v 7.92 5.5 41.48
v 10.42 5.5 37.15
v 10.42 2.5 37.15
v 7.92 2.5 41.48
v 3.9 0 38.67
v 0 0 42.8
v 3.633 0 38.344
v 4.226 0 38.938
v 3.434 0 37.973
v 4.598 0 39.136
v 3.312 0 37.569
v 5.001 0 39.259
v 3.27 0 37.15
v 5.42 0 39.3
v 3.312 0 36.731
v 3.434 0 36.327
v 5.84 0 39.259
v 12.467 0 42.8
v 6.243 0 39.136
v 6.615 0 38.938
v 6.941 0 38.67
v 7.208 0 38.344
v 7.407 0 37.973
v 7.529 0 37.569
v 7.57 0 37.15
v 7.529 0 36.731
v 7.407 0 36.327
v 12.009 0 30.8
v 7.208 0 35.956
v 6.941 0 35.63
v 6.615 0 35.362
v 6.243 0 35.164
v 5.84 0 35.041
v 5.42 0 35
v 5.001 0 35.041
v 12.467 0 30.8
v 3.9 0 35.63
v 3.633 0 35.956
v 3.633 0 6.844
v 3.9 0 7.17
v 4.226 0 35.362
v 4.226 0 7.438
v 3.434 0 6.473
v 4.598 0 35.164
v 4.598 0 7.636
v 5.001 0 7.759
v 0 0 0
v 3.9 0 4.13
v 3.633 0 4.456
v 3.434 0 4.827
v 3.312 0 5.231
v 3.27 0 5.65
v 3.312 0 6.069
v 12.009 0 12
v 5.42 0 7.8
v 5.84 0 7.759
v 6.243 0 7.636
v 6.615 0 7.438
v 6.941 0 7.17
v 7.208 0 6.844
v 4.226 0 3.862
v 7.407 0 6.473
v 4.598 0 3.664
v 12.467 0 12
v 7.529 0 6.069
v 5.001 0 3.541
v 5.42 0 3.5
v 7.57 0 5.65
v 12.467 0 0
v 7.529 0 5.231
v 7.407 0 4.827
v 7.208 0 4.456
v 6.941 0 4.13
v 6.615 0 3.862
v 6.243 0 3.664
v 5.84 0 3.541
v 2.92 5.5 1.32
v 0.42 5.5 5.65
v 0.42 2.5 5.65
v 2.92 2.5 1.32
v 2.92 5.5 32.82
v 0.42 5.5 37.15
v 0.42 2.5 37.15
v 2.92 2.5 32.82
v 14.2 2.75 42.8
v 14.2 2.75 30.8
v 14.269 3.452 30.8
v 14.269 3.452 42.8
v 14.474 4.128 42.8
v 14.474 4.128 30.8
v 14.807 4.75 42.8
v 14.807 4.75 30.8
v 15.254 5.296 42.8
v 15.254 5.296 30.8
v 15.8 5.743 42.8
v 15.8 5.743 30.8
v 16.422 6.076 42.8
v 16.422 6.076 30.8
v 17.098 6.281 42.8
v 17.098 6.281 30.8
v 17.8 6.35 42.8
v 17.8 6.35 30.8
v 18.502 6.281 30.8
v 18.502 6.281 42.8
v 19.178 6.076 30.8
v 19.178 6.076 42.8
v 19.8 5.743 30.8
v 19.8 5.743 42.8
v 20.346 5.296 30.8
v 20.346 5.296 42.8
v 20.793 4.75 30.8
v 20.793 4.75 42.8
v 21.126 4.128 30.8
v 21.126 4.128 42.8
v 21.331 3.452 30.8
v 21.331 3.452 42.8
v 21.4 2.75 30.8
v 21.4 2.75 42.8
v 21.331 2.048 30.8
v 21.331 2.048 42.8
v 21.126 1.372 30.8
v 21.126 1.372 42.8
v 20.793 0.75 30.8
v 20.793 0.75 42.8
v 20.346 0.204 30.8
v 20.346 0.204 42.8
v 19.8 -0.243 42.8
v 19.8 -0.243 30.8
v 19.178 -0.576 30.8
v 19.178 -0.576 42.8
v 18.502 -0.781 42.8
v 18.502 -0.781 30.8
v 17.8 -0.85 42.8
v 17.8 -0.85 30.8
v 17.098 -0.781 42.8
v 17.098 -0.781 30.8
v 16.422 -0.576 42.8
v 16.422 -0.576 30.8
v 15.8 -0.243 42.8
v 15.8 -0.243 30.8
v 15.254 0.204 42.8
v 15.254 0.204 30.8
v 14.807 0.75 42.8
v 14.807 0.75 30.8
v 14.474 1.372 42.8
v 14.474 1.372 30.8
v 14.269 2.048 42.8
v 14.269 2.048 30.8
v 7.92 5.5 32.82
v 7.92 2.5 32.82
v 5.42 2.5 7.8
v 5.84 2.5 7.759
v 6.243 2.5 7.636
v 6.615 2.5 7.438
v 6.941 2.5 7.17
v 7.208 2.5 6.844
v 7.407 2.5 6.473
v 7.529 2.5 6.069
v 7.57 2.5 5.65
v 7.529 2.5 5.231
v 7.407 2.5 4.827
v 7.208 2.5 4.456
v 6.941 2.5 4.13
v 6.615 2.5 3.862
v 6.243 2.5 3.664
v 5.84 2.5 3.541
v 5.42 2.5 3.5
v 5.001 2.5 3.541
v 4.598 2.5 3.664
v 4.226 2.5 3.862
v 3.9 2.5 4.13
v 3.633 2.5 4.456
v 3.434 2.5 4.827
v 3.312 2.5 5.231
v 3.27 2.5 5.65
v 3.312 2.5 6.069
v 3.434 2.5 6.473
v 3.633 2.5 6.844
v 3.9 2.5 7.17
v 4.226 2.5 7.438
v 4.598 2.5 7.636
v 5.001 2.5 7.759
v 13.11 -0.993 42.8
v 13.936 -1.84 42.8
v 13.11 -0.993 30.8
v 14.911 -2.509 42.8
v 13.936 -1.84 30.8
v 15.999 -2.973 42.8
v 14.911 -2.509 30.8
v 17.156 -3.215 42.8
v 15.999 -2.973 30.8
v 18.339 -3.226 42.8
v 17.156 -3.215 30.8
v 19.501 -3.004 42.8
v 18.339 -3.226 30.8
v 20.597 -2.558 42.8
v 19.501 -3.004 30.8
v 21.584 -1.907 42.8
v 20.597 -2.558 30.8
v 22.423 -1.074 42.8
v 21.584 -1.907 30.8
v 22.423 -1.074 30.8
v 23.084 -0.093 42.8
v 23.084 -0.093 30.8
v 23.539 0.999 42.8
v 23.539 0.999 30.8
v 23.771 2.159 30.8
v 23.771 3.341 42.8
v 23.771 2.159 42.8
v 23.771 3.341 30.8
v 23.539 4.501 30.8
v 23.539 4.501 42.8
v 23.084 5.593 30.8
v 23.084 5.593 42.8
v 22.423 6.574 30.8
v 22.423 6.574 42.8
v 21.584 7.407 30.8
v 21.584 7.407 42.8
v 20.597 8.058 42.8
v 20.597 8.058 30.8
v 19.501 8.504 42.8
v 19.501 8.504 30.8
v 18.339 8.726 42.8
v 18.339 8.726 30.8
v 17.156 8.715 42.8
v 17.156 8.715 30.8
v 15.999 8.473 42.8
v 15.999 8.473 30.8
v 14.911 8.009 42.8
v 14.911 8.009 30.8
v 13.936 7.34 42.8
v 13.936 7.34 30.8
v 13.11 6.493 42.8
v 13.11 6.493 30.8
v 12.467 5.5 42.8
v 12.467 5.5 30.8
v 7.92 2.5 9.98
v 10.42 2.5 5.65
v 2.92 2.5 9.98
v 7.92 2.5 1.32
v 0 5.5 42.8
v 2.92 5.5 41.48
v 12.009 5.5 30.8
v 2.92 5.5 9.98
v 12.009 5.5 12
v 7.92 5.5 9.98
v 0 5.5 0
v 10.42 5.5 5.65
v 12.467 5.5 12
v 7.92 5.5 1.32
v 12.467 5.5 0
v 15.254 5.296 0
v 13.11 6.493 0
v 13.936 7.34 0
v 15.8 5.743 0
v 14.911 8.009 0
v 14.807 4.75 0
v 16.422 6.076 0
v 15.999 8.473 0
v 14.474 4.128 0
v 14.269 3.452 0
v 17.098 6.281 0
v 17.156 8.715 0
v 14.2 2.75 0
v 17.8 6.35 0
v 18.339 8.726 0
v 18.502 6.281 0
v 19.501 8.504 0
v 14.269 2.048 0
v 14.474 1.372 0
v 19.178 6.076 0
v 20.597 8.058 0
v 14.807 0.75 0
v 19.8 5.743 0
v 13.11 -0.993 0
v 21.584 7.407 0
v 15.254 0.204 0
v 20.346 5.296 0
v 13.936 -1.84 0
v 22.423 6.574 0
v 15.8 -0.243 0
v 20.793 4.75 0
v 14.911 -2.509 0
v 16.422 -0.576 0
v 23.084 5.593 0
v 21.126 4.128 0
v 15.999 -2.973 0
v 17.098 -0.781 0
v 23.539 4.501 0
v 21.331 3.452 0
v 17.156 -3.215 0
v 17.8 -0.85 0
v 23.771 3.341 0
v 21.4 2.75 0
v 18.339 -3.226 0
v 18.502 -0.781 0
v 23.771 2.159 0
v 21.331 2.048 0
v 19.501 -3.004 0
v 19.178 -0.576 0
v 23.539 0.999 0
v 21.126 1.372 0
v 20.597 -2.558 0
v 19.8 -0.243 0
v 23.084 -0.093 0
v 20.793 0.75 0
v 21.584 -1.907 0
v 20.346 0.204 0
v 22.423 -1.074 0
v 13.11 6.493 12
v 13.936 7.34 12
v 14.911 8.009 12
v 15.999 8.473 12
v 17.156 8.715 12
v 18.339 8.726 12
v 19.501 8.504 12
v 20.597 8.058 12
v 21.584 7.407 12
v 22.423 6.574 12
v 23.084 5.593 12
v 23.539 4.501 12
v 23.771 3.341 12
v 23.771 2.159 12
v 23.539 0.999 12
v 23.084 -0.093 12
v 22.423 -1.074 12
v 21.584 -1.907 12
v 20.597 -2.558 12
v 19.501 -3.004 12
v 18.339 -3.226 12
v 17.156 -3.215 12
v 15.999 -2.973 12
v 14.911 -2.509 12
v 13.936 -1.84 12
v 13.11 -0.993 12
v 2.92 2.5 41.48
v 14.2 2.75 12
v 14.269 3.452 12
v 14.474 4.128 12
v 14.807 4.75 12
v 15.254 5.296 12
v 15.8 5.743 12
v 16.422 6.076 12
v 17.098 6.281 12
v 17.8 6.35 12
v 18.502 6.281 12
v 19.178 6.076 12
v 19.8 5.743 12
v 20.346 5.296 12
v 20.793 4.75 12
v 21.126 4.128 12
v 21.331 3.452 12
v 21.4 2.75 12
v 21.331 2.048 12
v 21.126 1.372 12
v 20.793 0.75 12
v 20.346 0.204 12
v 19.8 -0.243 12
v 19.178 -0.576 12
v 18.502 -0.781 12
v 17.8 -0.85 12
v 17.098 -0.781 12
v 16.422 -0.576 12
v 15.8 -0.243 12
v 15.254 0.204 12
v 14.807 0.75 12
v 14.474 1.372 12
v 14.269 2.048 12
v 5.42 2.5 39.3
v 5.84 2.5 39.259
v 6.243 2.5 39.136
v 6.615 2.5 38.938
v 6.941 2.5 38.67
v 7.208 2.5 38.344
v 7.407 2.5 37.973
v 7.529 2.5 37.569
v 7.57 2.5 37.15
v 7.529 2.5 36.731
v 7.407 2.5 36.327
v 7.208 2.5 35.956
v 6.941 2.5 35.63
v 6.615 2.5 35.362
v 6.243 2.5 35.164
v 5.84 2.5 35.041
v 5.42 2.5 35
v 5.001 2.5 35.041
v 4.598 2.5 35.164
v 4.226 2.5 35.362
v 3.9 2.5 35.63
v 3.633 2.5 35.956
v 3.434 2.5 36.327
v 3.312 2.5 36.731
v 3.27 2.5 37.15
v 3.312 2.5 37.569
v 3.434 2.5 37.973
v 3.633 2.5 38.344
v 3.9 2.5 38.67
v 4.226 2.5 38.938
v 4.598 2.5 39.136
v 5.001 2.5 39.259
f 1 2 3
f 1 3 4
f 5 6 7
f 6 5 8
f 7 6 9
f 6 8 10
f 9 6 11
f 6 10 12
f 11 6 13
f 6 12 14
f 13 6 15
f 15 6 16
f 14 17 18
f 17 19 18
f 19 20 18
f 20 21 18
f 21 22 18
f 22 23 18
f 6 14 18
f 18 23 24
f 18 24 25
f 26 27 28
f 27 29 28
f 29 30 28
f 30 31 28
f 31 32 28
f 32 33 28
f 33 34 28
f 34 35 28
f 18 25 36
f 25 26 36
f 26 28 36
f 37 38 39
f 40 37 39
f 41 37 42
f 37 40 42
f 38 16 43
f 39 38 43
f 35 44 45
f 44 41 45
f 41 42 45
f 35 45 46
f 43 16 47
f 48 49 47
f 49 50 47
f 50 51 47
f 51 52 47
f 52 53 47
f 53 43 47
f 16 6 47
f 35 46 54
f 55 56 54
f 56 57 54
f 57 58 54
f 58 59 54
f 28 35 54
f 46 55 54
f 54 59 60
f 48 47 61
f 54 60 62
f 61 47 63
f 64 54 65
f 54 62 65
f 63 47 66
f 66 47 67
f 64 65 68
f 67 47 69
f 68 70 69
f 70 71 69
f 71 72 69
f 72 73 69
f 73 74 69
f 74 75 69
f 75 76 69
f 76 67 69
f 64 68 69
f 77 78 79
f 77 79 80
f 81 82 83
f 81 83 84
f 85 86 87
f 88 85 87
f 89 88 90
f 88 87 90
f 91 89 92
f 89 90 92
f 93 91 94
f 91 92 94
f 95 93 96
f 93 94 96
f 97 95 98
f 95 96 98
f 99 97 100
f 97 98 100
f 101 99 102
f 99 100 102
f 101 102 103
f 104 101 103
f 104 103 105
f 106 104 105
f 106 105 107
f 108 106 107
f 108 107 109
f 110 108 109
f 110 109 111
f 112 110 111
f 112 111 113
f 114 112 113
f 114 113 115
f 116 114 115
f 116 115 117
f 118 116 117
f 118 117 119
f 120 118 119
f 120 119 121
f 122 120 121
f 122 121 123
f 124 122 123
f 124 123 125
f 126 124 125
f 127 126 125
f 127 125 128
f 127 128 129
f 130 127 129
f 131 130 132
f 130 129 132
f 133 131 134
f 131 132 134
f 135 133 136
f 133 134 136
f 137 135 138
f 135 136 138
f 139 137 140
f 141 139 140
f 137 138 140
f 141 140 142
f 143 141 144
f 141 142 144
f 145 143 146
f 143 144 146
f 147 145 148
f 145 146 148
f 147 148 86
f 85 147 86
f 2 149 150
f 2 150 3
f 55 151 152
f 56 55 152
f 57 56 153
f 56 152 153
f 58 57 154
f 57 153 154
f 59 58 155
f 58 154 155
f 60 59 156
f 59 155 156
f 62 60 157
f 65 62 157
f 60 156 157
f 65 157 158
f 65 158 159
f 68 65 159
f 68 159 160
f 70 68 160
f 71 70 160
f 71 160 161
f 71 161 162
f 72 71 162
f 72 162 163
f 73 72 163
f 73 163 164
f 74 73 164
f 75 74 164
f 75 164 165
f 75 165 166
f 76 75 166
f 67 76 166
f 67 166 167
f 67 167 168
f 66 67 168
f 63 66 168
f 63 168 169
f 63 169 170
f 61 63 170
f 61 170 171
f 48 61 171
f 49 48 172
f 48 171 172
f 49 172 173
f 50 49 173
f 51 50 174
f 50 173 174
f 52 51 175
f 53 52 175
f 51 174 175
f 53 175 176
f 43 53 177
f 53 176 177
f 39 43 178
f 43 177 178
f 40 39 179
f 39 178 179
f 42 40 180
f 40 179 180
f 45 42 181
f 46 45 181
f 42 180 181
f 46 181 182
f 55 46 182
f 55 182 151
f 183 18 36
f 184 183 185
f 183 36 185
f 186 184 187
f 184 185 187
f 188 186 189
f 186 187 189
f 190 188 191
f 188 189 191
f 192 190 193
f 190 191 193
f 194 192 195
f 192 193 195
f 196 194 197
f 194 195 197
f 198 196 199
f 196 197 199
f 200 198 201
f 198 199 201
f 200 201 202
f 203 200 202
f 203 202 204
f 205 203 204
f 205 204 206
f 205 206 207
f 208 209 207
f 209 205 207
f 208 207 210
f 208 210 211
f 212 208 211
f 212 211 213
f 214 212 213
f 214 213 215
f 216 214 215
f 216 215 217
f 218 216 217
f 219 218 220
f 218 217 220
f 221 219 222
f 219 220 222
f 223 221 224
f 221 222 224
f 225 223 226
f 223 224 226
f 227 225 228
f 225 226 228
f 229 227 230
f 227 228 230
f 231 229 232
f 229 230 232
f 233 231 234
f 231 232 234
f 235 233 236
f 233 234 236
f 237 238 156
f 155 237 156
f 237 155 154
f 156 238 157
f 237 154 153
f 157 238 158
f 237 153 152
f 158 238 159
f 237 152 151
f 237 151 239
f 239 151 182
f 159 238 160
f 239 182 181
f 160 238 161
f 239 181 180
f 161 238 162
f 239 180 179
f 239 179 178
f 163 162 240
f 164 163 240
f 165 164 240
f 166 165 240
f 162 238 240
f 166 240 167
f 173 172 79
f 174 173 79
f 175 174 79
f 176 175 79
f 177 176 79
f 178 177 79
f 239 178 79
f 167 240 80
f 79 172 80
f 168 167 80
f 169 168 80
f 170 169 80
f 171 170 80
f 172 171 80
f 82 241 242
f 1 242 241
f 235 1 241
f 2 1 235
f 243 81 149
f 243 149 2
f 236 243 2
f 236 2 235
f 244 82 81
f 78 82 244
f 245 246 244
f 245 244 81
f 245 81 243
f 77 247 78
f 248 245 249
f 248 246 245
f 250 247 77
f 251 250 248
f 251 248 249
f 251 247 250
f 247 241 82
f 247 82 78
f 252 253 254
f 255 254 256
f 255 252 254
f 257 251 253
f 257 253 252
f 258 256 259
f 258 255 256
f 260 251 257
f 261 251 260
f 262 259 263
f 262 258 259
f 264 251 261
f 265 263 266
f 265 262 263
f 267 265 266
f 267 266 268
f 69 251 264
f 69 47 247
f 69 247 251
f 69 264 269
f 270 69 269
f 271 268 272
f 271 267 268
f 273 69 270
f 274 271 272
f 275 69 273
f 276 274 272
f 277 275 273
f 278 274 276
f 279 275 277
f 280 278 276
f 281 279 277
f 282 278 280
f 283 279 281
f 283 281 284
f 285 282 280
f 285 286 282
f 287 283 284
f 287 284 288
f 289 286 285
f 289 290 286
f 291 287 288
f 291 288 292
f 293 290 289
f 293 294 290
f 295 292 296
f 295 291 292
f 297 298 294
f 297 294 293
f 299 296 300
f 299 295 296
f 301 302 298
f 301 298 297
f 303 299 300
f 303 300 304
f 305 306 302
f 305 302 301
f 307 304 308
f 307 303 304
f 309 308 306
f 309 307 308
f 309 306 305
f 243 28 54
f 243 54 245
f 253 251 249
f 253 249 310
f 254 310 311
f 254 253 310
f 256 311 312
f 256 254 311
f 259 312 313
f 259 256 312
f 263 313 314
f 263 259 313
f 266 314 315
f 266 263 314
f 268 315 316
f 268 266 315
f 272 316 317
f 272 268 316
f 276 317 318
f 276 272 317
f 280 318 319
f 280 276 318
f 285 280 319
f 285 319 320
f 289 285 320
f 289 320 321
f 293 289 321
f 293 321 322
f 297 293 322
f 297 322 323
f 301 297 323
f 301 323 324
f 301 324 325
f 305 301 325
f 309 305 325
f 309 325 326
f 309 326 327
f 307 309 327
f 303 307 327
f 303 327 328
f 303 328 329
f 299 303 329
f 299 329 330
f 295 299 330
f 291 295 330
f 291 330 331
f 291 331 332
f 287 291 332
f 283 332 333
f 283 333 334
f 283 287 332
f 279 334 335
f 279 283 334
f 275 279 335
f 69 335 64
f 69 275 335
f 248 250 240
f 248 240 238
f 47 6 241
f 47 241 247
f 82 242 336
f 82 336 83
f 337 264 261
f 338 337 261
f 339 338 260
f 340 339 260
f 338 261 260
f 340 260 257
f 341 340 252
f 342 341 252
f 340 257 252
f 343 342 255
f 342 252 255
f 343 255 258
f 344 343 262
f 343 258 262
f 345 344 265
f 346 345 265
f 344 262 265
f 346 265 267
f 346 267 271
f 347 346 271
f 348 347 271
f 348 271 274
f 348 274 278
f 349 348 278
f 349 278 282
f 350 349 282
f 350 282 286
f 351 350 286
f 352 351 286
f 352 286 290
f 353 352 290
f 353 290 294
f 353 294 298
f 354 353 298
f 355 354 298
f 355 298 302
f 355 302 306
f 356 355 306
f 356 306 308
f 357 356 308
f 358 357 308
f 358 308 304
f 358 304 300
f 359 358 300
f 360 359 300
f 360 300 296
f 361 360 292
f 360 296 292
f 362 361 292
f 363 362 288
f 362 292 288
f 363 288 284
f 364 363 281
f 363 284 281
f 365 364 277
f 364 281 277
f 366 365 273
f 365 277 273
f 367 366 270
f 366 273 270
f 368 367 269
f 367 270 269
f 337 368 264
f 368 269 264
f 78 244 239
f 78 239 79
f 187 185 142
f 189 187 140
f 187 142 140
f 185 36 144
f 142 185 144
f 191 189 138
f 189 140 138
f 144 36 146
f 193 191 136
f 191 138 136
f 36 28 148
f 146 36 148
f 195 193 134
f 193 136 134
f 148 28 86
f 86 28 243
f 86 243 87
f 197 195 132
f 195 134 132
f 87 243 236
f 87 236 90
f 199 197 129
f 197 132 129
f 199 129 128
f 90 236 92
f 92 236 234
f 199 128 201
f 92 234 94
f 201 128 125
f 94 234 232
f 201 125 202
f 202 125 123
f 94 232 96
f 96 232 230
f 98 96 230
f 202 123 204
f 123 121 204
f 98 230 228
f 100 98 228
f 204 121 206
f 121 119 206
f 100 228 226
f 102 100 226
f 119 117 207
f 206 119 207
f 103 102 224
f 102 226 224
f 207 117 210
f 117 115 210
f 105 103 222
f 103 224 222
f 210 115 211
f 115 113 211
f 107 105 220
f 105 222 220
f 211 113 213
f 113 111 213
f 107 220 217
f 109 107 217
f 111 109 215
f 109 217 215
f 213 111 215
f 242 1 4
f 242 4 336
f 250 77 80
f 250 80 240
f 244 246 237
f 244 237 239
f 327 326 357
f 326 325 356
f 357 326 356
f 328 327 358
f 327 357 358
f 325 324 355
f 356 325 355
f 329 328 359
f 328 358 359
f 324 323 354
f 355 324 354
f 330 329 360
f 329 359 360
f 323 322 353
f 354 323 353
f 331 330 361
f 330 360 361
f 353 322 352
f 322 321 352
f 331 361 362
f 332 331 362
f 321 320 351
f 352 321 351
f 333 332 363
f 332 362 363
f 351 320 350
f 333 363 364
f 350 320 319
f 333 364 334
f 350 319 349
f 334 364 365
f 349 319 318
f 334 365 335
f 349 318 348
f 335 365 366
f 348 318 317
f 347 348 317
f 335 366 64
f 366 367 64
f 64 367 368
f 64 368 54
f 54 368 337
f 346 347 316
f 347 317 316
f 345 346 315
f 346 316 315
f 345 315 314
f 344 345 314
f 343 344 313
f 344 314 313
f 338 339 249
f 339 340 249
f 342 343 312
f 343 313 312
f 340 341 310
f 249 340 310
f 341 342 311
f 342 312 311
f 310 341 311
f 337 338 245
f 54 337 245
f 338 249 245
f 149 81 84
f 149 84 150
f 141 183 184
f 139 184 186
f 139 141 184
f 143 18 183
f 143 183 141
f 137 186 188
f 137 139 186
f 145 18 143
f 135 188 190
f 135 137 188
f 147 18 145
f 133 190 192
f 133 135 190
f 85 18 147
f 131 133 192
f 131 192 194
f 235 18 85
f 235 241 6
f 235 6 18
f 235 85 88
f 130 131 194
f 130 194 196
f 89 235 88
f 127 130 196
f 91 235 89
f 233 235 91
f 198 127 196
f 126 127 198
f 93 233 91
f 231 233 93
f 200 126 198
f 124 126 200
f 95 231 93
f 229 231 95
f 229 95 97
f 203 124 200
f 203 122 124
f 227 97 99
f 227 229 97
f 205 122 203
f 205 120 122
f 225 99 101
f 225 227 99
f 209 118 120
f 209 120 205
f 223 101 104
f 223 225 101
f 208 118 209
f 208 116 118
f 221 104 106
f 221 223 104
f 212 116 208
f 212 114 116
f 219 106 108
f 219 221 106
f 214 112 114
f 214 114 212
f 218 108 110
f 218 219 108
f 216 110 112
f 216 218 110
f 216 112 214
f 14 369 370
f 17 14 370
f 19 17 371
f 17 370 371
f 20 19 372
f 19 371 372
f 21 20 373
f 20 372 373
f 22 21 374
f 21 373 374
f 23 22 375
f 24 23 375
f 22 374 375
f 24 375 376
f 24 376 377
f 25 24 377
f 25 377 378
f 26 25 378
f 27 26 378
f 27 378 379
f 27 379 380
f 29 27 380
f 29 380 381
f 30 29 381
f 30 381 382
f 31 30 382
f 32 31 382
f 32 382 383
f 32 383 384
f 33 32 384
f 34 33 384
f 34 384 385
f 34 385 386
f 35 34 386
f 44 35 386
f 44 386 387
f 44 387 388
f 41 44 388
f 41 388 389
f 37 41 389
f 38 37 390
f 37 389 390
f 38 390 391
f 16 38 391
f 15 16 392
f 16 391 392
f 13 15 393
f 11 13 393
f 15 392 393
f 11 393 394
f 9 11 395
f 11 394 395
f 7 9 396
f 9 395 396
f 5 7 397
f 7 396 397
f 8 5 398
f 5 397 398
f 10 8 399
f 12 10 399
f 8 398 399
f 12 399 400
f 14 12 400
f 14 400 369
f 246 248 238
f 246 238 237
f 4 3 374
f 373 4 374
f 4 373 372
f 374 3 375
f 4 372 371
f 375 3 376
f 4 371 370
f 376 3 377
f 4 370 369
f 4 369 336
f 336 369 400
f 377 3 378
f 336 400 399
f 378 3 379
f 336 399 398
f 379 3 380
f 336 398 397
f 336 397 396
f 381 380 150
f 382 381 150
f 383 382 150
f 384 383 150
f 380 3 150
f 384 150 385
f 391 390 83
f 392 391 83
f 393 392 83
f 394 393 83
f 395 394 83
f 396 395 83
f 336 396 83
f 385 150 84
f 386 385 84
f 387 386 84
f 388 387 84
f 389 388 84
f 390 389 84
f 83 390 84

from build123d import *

# Parameters (mm, degrees)
SKETCH_1_W          = 17.8
SKETCH_1_H          = 42.8
EXTRUDE_1_DEPTH     = 5.5
SKETCH_2_R          = 6
EXTRUDE_2_DEPTH     = 12
EXTRUDE_START       = -12
SKETCH_3_R          = 6
EXTRUDE_3_DEPTH     = 12
SKETCH_4_R          = 3.60024343
CUT_EXTRUDE_1_DEPTH = 51
SKETCH_5_W          = 5.942865046
SKETCH_5_H          = 10.697157082
CUT_EXTRUDE_2_DEPTH = 18.8
SKETCH_6_R          = 2.15
CUT_EXTRUDE_3_DEPTH = 10
CUT_EXTRUDE_4_DEPTH = 3


with BuildPart() as part:
    # 草图1 → 凸台-拉伸1 (new body)
    with BuildSketch(Plane(origin=(0, 0, 0), x_dir=(1, 0, 0), z_dir=(0, 1, 0))):
        with Locations((8.9, -21.4)):
            Rectangle(SKETCH_1_W, SKETCH_1_H)
    extrude(amount=EXTRUDE_1_DEPTH)

    # 草图2 → 凸台-拉伸2 (add)
    with BuildSketch(Plane(origin=(0, 0, 0), x_dir=(-1, 0, 0), z_dir=(0, 0, -1))):
        with Locations((-17.8, 2.75)):
            Circle(SKETCH_2_R)
    extrude(amount=-EXTRUDE_2_DEPTH)

    # 草图3 → 凸台-拉伸3 (add)
    with BuildSketch(Plane.XY.offset(42.8).offset(EXTRUDE_START)):
        with Locations((17.8, 2.75)):
            Circle(SKETCH_3_R)
    extrude(amount=EXTRUDE_3_DEPTH)

    # 草图4 → 切除-拉伸1 (cut)
    with BuildSketch(Plane(origin=(0, 0, 0), x_dir=(-1, 0, 0), z_dir=(0, 0, -1))):
        with Locations((-17.8, 2.75)):
            Circle(SKETCH_4_R)
    extrude(amount=-CUT_EXTRUDE_1_DEPTH, mode=Mode.SUBTRACT)

    # 草图5 → 切除-拉伸2 (cut)
    with BuildSketch(Plane(origin=(0, 0, 30.8), x_dir=(-1, 0, 0), z_dir=(0, 0, -1))):
        with Locations((-14.980093676, 2.655560542)):
            Rectangle(SKETCH_5_W, SKETCH_5_H)
    extrude(amount=CUT_EXTRUDE_2_DEPTH, mode=Mode.SUBTRACT)

    # 草图6 → 切除-拉伸3 (cut)
    with BuildSketch(Plane(origin=(0, 5.5, 0), x_dir=(1, 0, 0), z_dir=(0, 1, 0))):
        with Locations(Location((5.420411498, -5.65, 0), (0, 0, 270))):
            Circle(SKETCH_6_R)
        with Locations(Location((5.420411498, -37.15, 0), (0, 0, 270))):
            Circle(SKETCH_6_R)
    extrude(amount=-CUT_EXTRUDE_3_DEPTH, mode=Mode.SUBTRACT)

    # 草图7 → 切除-拉伸4 (cut)
    with BuildSketch(Plane(origin=(0, 5.5, 0), x_dir=(1, 0, 0), z_dir=(0, 1, 0))):
        Polygon((2.920411498, -1.319872981), (7.920411498, -1.319872981), (10.420411498, -5.65), (7.920411498, -9.980127019), (2.920411498, -9.980127019), (0.420411498, -5.65), align=None)
        Polygon((0.420411498, -37.15), (2.920411498, -32.819872981), (7.920411498, -32.819872981), (10.420411498, -37.15), (7.920411498, -41.480127019), (2.920411498, -41.480127019), align=None)
    extrude(amount=-CUT_EXTRUDE_4_DEPTH, mode=Mode.SUBTRACT)


solid = part.part
